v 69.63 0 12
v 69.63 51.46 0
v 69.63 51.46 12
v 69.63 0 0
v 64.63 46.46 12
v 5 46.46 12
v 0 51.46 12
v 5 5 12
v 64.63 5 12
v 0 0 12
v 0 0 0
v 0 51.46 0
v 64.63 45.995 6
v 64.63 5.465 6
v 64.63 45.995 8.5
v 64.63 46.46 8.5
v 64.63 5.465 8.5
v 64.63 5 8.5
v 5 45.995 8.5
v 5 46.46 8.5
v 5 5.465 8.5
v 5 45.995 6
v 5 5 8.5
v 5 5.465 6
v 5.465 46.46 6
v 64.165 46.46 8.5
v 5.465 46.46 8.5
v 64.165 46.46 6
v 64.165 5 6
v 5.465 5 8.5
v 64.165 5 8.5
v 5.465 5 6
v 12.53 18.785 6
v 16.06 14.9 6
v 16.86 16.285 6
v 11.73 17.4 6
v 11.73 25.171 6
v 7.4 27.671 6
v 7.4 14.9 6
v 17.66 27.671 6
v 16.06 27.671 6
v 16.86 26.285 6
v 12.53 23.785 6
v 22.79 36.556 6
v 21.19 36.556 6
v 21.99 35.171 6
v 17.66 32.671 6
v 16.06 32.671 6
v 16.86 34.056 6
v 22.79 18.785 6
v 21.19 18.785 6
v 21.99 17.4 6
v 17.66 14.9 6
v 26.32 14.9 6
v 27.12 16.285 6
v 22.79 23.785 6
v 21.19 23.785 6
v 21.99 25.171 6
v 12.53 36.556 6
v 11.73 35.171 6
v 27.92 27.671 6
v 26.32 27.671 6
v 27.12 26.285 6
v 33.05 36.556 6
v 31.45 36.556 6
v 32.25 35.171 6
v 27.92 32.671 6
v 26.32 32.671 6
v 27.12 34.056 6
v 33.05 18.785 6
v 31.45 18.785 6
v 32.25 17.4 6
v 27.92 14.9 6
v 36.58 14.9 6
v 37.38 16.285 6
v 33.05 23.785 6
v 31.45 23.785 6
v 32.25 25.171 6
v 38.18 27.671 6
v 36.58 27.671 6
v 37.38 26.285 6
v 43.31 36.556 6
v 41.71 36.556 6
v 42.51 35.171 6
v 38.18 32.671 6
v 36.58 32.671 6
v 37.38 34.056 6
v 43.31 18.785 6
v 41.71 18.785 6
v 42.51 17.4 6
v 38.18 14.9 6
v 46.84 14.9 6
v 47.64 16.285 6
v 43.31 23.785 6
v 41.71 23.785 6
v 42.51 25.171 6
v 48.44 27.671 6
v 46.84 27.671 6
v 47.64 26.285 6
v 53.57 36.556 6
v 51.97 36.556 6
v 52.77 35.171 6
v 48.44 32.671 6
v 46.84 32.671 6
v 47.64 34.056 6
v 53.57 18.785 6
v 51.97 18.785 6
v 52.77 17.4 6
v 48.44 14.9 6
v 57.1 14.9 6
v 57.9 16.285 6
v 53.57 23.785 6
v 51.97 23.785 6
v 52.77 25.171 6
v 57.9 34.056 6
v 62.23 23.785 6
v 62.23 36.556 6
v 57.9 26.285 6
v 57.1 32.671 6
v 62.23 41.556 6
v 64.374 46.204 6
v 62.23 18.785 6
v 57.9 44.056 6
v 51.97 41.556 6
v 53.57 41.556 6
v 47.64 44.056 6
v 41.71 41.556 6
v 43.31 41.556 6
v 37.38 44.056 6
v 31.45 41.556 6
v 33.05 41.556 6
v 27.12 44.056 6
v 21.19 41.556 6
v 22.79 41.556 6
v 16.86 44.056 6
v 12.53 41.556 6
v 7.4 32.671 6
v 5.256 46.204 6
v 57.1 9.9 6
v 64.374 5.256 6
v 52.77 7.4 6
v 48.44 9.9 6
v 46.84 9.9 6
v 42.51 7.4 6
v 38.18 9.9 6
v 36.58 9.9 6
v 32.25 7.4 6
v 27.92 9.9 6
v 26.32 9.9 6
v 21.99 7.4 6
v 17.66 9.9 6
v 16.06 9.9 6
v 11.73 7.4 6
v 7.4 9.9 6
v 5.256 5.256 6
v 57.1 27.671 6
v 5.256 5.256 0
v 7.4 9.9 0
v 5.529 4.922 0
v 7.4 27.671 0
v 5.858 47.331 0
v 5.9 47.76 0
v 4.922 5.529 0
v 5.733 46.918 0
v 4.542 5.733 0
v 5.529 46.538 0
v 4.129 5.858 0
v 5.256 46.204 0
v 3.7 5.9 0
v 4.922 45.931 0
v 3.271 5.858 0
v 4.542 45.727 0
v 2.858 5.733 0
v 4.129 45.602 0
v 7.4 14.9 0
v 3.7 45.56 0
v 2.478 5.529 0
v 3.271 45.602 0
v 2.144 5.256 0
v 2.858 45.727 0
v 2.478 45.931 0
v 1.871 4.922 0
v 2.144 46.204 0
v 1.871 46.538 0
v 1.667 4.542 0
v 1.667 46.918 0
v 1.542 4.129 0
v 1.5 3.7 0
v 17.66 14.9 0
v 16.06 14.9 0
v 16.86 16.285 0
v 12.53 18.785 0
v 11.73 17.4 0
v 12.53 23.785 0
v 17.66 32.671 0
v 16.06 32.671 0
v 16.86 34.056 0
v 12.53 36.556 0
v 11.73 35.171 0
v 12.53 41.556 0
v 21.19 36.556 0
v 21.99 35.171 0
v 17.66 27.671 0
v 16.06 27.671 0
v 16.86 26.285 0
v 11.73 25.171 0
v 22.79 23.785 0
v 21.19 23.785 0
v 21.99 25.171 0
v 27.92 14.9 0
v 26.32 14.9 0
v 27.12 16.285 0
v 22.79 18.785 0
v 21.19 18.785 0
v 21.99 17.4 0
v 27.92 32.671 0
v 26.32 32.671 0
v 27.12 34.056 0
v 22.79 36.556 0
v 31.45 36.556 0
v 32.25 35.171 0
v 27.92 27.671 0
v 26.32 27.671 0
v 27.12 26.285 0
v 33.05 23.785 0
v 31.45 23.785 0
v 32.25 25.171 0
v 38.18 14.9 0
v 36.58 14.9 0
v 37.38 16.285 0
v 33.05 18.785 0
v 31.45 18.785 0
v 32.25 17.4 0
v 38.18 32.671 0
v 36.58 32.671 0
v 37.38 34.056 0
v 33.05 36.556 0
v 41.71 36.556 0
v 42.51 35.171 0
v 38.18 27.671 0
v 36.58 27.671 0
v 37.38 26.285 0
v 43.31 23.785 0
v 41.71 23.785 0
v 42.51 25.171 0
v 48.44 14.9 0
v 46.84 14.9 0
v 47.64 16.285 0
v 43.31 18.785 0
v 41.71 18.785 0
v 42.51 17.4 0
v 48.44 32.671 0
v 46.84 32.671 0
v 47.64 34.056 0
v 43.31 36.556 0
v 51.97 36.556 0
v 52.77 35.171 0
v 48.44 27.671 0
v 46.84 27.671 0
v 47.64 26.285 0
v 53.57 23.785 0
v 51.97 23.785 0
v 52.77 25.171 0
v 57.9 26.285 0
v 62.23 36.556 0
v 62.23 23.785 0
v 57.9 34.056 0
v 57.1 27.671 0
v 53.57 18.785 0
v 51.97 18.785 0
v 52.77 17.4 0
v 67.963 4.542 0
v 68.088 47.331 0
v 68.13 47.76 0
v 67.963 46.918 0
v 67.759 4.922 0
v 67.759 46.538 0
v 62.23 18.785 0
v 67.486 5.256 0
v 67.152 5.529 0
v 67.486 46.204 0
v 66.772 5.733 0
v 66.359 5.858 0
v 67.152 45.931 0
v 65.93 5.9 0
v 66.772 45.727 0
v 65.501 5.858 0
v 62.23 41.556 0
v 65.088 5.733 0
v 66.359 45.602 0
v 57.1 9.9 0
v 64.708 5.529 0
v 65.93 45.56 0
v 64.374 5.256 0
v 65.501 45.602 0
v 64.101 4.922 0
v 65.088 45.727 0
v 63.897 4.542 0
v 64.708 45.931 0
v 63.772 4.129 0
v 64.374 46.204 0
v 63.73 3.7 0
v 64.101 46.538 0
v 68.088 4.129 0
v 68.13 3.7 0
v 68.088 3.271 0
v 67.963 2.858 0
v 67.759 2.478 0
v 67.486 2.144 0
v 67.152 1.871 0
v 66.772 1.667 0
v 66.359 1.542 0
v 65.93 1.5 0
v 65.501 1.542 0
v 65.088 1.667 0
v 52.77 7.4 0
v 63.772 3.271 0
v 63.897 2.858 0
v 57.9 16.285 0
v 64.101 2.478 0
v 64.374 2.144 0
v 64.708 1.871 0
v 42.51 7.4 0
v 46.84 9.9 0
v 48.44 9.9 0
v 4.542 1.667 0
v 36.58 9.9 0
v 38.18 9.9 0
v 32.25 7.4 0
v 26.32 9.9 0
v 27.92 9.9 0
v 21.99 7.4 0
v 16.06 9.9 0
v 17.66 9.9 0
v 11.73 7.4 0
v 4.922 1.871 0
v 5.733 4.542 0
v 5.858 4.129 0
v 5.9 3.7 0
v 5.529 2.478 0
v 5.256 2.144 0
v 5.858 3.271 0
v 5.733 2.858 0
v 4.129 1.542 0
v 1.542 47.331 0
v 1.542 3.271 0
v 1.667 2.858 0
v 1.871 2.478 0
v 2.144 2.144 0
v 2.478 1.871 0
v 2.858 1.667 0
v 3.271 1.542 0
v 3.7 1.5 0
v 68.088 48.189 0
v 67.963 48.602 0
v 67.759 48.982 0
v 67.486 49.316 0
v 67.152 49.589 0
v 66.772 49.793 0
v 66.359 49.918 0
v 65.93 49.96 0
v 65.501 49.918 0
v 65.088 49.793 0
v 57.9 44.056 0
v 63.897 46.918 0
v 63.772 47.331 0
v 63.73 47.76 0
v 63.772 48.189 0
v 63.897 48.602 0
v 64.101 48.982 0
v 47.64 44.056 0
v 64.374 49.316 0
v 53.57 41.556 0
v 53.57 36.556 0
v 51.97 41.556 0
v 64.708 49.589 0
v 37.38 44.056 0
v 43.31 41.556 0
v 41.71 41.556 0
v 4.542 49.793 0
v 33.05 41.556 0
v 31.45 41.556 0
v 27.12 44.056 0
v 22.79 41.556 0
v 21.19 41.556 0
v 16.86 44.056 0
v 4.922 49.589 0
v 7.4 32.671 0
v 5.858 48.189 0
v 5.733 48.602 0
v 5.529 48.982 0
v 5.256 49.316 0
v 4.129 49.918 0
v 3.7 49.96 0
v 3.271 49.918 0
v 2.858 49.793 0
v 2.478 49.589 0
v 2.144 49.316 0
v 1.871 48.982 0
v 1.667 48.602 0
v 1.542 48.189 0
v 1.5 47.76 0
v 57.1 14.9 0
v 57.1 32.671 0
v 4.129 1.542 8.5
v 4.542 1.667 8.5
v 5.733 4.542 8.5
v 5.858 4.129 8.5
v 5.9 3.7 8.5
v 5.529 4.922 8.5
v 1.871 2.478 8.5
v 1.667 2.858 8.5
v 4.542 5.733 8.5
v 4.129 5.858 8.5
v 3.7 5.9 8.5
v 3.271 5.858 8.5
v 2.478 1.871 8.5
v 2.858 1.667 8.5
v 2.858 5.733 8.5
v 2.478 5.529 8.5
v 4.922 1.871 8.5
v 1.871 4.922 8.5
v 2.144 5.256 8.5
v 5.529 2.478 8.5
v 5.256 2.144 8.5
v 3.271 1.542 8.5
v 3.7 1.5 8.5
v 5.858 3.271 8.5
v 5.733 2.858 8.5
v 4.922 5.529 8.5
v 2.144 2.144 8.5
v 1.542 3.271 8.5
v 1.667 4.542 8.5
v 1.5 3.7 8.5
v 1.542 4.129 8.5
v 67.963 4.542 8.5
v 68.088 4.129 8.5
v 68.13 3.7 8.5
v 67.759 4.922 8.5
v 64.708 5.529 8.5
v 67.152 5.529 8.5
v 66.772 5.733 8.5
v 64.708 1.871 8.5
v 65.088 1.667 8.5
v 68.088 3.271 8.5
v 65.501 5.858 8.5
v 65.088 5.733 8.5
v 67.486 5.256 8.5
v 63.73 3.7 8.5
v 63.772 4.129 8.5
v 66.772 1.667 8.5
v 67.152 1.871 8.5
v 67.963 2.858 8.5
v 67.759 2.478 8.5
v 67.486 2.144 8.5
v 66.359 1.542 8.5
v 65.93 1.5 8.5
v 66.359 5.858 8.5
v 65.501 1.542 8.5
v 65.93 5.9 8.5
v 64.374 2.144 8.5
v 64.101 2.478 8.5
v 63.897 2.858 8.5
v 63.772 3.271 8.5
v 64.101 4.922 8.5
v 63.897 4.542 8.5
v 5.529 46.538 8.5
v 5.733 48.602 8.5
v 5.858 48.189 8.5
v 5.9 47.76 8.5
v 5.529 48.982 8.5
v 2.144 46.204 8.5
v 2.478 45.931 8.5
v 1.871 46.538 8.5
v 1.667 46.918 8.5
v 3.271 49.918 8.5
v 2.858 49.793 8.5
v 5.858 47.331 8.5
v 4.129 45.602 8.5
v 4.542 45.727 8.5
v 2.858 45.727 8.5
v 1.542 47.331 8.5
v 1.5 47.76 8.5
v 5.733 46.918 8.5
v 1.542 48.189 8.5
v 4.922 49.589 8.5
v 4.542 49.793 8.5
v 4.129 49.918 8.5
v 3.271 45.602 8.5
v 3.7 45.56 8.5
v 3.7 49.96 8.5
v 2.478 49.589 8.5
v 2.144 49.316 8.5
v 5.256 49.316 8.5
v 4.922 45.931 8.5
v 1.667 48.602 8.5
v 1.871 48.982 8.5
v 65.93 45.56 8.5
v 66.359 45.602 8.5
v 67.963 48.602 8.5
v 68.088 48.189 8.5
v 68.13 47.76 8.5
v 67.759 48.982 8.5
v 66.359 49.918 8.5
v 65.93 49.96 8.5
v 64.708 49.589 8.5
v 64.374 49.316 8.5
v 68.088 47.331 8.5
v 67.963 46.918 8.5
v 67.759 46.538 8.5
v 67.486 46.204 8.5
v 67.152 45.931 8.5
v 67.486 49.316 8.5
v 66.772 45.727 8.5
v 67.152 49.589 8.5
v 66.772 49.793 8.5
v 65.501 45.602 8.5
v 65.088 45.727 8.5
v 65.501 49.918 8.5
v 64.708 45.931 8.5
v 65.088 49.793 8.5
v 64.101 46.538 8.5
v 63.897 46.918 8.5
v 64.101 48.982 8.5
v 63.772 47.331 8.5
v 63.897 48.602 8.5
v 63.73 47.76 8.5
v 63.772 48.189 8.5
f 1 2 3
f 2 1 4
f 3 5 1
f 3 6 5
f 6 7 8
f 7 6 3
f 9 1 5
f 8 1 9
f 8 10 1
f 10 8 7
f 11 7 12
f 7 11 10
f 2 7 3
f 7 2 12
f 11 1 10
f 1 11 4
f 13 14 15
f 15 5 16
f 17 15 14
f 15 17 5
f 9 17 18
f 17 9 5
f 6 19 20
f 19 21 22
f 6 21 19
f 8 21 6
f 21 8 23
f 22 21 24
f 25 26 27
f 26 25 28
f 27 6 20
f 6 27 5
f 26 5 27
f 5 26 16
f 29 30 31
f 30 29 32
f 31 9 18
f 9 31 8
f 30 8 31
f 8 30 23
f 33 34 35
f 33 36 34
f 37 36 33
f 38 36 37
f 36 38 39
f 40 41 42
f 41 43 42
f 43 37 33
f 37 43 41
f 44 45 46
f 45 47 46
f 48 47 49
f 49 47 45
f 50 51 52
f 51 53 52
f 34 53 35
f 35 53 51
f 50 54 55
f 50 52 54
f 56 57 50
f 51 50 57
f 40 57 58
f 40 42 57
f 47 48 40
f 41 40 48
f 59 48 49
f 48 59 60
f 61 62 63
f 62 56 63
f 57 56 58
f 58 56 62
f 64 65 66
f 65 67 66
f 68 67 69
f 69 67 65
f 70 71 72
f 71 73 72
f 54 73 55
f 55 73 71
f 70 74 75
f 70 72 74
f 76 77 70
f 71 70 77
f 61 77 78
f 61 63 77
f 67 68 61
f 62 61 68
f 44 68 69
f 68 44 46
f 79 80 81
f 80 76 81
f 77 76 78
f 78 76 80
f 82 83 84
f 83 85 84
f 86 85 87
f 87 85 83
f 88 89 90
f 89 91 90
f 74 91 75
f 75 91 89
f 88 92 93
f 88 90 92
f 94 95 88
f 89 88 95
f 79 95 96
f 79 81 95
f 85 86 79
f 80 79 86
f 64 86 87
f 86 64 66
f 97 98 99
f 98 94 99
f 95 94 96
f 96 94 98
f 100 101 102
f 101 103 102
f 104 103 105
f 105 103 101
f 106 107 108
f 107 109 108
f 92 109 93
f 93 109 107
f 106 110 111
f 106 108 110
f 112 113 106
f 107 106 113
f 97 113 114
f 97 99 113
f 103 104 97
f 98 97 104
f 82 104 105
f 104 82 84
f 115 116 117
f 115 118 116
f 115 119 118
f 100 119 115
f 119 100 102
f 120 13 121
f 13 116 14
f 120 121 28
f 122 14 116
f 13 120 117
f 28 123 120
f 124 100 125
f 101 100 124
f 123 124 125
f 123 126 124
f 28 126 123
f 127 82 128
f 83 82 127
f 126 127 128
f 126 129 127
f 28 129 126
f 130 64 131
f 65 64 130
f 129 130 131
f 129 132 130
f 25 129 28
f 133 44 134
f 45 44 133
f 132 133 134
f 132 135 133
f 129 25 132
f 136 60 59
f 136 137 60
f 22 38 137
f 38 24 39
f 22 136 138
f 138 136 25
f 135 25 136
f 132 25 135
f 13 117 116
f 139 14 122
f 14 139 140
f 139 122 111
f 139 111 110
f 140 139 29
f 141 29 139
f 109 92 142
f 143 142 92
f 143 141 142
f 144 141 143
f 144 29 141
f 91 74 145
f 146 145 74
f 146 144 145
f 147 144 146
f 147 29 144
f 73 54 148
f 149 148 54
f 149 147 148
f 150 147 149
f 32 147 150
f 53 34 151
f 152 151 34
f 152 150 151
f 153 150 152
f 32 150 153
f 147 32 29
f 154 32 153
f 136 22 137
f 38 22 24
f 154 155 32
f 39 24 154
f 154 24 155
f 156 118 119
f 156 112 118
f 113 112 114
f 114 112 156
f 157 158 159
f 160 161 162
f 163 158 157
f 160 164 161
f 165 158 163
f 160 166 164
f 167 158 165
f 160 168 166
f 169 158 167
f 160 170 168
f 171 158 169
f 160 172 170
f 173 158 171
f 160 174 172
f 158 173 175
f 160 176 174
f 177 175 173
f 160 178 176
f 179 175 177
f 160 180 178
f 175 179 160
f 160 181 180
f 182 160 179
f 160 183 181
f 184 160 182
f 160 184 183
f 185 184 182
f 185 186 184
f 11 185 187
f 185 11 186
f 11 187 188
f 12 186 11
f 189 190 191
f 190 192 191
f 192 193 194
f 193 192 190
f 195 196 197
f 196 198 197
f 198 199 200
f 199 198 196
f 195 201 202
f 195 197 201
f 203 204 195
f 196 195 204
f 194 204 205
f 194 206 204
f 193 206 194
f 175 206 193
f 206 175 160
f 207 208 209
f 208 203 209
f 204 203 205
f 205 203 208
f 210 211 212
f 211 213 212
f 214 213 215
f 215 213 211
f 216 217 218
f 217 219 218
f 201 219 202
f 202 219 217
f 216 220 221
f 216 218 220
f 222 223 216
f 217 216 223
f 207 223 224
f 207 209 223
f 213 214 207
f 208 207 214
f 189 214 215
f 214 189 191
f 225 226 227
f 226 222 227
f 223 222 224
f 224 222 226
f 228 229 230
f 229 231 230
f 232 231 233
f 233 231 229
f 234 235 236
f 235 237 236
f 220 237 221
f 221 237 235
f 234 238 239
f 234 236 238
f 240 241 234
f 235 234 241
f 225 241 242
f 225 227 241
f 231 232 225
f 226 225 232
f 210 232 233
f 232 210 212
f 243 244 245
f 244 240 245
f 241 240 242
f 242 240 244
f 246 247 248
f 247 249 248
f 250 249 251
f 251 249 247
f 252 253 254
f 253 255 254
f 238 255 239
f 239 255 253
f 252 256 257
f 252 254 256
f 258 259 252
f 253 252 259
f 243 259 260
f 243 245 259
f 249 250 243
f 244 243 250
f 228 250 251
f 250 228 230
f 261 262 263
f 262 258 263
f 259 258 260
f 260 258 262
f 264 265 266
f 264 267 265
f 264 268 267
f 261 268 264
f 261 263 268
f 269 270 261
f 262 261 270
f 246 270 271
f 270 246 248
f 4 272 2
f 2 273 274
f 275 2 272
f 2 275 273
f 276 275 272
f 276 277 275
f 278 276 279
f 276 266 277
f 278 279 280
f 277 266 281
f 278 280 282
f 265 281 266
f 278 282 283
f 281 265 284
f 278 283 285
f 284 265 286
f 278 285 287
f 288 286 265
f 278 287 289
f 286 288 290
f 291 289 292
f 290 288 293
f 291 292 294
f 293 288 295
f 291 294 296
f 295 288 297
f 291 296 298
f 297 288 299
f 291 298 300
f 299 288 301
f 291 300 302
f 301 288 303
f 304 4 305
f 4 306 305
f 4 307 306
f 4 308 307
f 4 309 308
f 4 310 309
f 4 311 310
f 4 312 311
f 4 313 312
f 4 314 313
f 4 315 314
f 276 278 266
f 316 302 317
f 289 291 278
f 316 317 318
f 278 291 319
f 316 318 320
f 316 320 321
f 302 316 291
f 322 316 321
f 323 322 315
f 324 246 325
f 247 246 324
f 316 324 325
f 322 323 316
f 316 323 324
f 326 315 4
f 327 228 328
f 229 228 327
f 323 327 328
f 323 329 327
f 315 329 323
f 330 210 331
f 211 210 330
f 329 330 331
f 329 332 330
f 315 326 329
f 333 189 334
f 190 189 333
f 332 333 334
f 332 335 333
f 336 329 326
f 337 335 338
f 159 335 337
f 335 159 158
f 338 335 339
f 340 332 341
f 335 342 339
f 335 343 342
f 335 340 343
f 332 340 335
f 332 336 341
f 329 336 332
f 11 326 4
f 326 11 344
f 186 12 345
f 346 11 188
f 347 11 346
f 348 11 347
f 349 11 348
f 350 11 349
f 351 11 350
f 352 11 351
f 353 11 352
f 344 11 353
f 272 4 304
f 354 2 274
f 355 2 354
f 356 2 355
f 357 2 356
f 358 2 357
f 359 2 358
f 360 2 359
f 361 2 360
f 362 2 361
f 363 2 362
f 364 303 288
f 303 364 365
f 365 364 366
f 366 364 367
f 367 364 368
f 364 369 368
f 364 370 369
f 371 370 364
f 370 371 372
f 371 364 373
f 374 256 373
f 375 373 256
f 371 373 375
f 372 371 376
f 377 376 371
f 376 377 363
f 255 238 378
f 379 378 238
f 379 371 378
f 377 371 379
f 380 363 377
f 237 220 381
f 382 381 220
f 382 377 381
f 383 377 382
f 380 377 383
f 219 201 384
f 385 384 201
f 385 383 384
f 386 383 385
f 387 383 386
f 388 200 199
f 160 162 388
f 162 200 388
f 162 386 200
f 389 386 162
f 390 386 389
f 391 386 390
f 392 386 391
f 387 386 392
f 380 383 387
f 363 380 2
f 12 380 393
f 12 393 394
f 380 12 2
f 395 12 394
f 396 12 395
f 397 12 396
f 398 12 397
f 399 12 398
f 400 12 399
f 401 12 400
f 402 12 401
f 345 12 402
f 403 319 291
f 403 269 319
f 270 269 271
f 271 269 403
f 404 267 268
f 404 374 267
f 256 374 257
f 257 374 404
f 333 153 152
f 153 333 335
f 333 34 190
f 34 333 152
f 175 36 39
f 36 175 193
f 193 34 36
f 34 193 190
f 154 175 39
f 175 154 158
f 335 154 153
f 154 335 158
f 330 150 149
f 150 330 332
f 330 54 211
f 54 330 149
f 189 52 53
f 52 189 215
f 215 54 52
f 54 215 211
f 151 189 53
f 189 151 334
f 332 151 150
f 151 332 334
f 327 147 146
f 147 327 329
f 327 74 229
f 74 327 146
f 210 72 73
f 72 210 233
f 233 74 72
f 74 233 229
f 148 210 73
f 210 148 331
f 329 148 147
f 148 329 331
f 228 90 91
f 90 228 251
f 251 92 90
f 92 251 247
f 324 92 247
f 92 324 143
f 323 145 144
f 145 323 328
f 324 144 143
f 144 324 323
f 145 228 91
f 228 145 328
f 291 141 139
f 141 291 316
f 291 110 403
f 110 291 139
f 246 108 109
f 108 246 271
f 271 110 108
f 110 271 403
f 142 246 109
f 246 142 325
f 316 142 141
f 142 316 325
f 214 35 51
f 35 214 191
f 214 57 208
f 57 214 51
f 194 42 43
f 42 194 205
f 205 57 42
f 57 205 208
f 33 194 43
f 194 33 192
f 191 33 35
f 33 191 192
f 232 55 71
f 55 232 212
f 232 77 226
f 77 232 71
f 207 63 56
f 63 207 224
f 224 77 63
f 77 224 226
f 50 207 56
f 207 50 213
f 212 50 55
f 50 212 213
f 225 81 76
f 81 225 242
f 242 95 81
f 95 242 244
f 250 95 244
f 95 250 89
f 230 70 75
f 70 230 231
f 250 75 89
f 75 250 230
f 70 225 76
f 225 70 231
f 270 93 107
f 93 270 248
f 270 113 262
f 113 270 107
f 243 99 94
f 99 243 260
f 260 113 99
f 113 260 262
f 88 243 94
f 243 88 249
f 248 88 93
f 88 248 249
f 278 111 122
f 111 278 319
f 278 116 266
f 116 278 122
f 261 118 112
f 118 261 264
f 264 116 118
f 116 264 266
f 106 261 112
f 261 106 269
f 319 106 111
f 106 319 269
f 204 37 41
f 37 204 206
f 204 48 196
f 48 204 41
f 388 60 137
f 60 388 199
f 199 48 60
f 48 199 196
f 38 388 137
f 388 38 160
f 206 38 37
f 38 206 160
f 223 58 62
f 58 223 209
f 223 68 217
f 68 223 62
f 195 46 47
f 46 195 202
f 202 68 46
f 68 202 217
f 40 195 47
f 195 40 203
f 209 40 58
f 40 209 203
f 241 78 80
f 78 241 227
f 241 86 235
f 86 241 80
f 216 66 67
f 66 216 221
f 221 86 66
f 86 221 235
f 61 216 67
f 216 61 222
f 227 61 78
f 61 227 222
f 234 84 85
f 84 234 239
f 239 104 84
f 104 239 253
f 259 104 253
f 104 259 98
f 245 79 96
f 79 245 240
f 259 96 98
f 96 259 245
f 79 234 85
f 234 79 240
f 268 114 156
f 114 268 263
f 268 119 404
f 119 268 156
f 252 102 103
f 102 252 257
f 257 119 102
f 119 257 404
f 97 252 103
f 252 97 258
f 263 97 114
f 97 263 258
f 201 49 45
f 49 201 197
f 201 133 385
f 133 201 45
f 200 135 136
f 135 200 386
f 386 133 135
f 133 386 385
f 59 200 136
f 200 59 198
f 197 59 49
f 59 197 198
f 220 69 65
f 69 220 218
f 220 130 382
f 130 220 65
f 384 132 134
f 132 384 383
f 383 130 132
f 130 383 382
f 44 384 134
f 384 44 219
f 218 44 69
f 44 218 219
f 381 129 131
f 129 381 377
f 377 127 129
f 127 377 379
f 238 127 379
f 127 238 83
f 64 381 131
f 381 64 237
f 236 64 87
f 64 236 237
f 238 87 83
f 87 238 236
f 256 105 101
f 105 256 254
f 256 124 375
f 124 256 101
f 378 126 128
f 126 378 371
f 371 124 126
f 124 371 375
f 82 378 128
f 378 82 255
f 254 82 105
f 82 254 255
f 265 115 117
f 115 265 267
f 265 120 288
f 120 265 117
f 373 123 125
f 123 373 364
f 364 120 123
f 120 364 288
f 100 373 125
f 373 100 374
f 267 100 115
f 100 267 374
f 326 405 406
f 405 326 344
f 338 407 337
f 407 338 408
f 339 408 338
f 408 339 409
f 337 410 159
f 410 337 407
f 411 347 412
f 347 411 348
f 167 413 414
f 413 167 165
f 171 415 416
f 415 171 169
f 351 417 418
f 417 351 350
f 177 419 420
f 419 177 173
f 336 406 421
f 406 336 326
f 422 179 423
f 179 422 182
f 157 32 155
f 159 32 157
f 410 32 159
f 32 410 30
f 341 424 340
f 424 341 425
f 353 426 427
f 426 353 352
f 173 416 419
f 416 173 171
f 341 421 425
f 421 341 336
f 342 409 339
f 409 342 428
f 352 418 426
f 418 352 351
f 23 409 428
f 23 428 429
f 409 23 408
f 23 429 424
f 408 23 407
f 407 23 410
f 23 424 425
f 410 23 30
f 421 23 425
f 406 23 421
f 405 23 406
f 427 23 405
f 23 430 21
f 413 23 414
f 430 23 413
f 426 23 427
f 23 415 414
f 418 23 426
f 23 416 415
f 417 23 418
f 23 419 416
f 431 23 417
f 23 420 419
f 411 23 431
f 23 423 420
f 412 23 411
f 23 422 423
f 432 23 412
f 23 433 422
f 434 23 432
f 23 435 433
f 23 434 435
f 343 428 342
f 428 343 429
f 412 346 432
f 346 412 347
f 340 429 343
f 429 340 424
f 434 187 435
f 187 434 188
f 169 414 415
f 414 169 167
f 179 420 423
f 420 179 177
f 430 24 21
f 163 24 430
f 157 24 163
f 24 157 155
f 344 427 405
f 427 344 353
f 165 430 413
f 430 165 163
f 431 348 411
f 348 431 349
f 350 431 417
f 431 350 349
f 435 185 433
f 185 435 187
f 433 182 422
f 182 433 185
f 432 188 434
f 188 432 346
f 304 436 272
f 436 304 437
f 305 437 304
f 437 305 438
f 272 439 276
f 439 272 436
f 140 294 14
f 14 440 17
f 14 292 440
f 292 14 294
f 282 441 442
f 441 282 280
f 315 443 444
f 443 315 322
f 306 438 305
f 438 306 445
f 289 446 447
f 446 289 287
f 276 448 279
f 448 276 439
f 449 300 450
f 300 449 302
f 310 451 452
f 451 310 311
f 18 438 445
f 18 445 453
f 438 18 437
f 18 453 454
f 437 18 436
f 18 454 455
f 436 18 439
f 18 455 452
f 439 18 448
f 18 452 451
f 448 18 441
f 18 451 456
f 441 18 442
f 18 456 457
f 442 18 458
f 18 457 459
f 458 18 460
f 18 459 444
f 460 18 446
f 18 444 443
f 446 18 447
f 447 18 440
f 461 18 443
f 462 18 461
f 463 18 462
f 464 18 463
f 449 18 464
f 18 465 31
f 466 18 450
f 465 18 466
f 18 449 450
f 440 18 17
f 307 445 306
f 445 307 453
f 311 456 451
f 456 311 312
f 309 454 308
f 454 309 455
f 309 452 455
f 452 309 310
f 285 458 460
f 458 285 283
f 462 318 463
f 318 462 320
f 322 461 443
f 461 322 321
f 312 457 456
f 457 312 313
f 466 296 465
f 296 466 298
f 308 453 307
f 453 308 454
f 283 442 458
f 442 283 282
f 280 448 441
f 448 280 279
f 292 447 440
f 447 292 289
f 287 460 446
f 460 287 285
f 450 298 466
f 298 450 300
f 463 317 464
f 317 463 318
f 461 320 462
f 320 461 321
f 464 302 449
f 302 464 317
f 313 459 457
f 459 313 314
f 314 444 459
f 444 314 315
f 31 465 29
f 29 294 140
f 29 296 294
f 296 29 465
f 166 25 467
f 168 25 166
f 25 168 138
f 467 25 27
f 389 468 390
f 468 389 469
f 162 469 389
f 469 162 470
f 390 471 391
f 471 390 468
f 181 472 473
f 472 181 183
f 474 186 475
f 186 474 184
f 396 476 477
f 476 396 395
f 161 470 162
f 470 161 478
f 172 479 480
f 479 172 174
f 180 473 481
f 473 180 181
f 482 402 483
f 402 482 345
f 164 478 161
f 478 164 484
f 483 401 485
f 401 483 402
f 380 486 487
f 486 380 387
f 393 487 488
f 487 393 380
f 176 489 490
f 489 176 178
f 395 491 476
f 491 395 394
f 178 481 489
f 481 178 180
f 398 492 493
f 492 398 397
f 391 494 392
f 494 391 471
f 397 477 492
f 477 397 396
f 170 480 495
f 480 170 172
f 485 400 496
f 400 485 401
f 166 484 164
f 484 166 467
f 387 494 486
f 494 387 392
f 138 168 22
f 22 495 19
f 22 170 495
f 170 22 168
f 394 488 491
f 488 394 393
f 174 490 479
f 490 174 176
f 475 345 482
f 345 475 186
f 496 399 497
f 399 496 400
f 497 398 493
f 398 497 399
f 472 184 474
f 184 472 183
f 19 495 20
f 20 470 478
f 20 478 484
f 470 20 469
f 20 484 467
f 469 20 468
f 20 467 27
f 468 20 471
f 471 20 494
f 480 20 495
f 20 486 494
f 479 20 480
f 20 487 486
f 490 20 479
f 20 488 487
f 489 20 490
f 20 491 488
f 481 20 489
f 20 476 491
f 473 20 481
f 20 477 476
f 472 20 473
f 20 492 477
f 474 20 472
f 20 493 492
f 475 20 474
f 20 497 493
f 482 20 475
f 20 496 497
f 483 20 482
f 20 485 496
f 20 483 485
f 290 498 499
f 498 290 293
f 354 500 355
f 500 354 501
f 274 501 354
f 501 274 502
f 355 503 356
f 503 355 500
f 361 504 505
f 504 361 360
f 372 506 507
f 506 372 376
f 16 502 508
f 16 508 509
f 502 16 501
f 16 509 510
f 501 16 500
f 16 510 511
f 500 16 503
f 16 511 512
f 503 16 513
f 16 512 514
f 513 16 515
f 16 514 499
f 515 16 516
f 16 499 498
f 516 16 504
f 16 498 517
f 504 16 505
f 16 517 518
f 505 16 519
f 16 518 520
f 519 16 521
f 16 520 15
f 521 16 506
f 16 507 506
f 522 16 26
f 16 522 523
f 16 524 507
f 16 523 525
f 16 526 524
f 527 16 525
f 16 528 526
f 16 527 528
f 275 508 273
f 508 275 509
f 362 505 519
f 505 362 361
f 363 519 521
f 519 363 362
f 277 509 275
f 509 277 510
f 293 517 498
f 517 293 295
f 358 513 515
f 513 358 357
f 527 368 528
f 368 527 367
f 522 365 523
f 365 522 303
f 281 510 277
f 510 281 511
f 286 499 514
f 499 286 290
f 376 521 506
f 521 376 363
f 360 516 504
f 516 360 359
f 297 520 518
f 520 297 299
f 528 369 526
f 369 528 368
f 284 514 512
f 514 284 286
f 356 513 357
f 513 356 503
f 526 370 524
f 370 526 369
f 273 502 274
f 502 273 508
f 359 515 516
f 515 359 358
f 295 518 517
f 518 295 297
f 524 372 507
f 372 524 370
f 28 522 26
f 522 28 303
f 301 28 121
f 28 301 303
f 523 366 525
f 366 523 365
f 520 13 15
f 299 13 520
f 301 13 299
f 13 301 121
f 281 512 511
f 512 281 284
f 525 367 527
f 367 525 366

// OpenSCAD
$fn = 32;

// ----------------------------------------------------------------------
// Honeycomb panel: 69.63 x 51.46 mm, 20 cells of 10 mm
// ----------------------------------------------------------------------

// --- parameters (mm) ---
panel_w = 69.63;          // panel width
panel_d = 51.46;          // panel depth
thick = 6;                // panel thickness
cell_r = 5;               // hex cell circumradius
pitch = 10.26;            // hex cell pitch (centre to centre)
web = 1.6;                // web between the cells
columns = 5;              // columns of cells
rows = 4;                 // rows of cells
cell_count = 20;          // total cells
shift_x = 11.73;          // first cell offset in x
shift_y = 12.4;           // first cell offset in y
mount_d = 4.4;            // corner mounting holes
hole_off = 3.7;           // mounting hole offset from the corners
rim_h = 12;               // rim height
rim_t = 5;                // rim wall thickness

difference() {
  union() {
    cube([panel_w, panel_d, thick]);
    /* rim around the panel, sunk 1 mm into the plate */
    translate([0, 0, thick - 1]) difference() {
      cube([panel_w, panel_d, rim_h - thick + 1]);
      translate([rim_t, rim_t, -2.5]) cube([panel_w - 2 * rim_t, panel_d - 2 * rim_t, rim_h - thick + 6]);
    }
  }
  /* hexagonal cells, point-up, cut right through the plate */
  for (row = [0 : rows - 1]) {
    for (col = [0 : columns - 1]) {
      translate([shift_x + col * pitch + (row % 2) * pitch / 2, shift_y + row * pitch * 0.866025, -2.5]) rotate([0, 0, 30]) cylinder(h = thick + 5, d = 2 * cell_r, $fn = 6);
    }
  }
  /* corner mounting holes, clear of the outer cell web */
  translate([3.7, 3.7, -2.5]) cylinder(h = thick + 5, d = mount_d);
  translate([65.93, 3.7, -2.5]) cylinder(h = thick + 5, d = mount_d);
  translate([3.7, 47.76, -2.5]) cylinder(h = thick + 5, d = mount_d);
  translate([65.93, 47.76, -2.5]) cylinder(h = thick + 5, d = mount_d);
}
